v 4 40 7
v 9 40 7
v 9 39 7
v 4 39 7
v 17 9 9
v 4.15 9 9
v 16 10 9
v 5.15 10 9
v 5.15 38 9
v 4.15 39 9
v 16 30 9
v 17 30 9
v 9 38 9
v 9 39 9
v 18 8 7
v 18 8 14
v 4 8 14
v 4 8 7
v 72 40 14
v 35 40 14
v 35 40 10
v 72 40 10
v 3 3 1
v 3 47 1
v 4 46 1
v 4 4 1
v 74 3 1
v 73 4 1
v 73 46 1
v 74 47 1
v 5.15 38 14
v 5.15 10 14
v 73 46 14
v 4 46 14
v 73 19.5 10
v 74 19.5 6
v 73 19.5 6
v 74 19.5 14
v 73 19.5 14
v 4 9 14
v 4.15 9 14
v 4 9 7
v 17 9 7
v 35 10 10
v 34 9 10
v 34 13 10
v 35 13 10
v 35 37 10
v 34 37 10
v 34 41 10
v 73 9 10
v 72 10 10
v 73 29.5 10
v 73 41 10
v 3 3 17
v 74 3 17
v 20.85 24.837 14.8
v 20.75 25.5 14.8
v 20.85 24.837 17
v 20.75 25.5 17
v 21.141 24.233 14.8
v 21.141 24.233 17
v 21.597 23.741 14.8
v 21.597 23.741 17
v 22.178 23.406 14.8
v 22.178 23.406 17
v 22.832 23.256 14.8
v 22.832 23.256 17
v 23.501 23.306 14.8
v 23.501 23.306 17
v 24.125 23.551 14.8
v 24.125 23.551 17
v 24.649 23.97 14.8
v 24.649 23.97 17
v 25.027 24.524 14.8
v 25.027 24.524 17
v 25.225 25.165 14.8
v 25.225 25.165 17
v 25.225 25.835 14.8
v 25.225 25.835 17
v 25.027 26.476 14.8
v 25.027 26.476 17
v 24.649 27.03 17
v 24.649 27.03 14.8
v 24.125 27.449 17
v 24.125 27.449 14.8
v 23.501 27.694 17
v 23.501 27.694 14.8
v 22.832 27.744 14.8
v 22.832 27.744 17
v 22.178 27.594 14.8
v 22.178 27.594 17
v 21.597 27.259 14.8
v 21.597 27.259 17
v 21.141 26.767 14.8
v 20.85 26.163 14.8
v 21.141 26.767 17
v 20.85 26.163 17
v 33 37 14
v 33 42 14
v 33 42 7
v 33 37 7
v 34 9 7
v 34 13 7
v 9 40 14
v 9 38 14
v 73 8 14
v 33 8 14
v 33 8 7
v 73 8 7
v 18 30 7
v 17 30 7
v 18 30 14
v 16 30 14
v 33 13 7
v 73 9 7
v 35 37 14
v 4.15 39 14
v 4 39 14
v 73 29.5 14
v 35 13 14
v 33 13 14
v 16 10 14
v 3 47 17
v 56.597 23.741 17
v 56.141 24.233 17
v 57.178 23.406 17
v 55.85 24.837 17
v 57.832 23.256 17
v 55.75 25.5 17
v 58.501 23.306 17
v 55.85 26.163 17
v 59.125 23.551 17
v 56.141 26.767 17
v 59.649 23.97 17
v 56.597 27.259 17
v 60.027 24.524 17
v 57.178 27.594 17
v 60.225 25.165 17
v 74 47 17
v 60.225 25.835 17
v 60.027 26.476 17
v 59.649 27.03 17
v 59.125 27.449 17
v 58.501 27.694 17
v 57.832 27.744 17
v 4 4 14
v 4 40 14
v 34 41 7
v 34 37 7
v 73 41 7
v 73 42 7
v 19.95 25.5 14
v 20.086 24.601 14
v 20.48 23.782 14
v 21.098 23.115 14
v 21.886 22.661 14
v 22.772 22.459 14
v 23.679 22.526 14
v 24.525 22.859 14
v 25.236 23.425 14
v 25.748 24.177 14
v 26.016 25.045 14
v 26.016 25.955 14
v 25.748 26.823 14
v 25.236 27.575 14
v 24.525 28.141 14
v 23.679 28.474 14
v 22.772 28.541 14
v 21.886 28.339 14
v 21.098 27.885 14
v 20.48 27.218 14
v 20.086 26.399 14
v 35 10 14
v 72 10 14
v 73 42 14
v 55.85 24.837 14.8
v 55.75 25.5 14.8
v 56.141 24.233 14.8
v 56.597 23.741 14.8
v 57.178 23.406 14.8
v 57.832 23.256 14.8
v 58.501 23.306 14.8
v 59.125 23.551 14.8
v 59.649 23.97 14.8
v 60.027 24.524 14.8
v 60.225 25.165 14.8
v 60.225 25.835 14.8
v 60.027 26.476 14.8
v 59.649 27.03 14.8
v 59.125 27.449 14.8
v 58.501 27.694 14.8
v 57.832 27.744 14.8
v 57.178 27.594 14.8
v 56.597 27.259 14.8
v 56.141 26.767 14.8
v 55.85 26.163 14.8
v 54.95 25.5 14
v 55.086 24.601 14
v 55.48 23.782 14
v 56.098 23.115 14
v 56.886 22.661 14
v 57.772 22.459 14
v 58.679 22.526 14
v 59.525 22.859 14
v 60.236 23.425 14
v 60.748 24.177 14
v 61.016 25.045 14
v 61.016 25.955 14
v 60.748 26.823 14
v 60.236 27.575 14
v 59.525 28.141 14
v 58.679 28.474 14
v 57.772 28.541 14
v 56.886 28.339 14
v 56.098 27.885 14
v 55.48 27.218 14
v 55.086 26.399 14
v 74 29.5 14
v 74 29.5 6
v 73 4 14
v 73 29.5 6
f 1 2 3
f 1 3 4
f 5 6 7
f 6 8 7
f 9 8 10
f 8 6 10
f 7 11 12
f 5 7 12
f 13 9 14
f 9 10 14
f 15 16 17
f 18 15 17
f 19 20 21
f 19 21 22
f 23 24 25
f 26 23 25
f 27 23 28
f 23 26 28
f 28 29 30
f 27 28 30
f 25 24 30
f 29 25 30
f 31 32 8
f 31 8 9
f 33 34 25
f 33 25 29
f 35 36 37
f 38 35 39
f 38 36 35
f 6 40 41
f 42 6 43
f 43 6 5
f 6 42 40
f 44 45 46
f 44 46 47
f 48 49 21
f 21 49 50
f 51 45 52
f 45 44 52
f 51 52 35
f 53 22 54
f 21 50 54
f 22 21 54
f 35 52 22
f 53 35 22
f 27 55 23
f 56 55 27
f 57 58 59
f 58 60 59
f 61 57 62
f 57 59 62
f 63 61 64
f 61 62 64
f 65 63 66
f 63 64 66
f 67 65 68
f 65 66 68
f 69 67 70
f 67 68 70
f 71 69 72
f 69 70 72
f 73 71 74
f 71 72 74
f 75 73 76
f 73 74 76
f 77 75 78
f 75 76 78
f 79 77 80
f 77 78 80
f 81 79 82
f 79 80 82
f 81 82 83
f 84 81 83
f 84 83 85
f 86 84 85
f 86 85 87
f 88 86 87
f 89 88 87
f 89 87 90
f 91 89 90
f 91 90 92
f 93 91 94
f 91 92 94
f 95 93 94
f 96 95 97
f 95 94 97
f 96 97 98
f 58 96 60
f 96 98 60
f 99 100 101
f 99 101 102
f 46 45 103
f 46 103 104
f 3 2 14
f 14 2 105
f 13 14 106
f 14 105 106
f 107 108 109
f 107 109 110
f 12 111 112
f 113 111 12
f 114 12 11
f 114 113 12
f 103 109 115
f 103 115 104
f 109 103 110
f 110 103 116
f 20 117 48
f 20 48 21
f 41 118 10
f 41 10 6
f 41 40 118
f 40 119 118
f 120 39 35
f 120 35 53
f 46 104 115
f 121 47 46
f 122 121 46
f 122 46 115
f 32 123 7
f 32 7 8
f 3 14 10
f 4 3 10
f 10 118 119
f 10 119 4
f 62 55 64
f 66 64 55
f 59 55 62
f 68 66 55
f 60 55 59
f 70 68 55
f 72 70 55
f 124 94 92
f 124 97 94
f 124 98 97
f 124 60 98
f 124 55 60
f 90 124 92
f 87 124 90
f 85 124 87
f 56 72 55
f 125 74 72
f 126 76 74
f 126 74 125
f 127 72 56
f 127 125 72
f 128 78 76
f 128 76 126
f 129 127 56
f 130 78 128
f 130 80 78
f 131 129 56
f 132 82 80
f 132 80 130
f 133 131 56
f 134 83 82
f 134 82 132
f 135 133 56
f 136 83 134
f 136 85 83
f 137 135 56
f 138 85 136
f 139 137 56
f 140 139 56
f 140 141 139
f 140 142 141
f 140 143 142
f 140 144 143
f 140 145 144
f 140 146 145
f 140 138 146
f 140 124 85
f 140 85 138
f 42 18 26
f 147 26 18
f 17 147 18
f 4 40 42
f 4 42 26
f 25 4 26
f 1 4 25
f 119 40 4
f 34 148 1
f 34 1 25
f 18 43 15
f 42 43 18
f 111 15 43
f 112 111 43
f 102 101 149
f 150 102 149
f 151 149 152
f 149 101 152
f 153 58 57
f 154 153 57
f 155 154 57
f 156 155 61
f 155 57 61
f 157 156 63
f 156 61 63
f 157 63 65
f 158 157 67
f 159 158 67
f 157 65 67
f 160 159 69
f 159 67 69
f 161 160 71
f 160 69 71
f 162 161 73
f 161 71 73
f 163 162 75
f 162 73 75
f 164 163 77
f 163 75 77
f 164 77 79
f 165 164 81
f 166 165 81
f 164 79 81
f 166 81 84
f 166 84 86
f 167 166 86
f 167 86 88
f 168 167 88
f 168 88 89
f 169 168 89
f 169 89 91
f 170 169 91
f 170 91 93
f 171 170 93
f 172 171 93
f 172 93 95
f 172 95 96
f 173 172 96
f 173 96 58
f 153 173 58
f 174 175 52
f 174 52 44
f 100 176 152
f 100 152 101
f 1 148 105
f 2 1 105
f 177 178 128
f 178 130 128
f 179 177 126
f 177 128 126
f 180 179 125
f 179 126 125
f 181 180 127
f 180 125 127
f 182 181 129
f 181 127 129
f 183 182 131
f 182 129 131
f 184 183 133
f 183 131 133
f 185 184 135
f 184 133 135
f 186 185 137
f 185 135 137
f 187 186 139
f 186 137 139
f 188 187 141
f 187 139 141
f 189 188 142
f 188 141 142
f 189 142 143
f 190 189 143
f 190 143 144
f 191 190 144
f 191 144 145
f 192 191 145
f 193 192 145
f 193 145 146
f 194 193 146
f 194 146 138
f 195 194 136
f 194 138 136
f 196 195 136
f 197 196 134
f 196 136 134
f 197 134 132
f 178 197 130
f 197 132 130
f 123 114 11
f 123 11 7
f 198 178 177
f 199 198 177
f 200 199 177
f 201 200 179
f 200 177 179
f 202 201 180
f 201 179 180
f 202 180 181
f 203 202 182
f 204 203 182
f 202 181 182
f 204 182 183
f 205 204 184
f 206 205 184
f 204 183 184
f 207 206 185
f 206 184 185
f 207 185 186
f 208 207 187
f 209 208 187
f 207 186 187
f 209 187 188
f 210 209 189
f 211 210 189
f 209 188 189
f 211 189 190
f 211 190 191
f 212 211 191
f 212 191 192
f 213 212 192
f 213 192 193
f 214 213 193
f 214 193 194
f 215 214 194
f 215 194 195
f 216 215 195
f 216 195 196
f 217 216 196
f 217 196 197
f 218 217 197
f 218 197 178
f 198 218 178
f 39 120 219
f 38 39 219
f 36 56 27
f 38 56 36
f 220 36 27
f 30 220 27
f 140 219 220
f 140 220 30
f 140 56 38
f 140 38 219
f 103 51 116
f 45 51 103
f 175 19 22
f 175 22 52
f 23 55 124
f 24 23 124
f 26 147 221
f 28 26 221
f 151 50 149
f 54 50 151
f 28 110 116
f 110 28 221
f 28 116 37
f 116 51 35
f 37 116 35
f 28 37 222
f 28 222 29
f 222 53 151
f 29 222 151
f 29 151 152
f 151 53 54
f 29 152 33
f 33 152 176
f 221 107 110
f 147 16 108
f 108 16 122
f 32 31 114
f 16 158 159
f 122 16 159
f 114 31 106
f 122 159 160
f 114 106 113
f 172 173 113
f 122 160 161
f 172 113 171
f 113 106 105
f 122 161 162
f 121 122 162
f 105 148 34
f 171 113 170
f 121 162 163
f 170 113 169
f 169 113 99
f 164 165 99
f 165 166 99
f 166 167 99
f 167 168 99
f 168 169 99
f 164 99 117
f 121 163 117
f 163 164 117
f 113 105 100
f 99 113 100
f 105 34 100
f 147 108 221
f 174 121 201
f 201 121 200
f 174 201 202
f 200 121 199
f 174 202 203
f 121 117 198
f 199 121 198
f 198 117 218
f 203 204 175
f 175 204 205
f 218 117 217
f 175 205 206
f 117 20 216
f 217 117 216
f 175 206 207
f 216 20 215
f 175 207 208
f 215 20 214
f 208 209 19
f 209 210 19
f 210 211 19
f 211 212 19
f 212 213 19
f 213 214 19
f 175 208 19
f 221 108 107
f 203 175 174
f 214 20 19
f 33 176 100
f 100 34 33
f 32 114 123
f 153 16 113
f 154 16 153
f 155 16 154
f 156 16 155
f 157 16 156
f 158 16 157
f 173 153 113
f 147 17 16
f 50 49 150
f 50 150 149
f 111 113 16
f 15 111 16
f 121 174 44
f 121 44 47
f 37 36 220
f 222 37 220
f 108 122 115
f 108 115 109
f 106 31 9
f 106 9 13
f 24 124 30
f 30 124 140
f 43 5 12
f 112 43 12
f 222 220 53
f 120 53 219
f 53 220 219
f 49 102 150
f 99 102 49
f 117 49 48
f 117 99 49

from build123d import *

# Parameters (mm, degrees)
SKETCH033_W         = 71
SKETCH033_H         = 44
PAD022_DEPTH        = 3
HOLE003_D           = 4.5
HOLE003_DEPTH       = 25
HOLE003_CSINK_D     = 6.1
HOLE003_CSINK_ANGLE = 90
PAD023_DEPTH        = 7
SKETCH036_W         = 71
SKETCH036_H         = 44
SKETCH036_W_2       = 69
SKETCH036_H_2       = 42
PAD024_DEPTH        = 13
PAD025_DEPTH        = 7
SKETCH_W            = 10
SKETCH_H            = 8
POCKET005_DEPTH     = 5
PAD026_DEPTH        = 5
PAD029_DEPTH        = 4


with BuildPart() as part:
    # Sketch033 → Pad022 (new body)
    with BuildSketch(Plane.XY):
        with Locations((35.5, 22)):
            Rectangle(SKETCH033_W, SKETCH033_H)
    extrude(amount=-PAD022_DEPTH)

    # Hole003
    with Locations(Plane(origin=(0, 0, -3), x_dir=(1, 0, 0), z_dir=(0, 0, -1))):
        with Locations((20, -22.5), (55, -22.5)):
            CounterSinkHole(HOLE003_D / 2, HOLE003_CSINK_D / 2, depth=HOLE003_DEPTH, counter_sink_angle=HOLE003_CSINK_ANGLE)

    # Sketch035 → Pad023 (join)
    with BuildSketch(Plane.XY.offset(-3)):
        Polygon((71, 39), (30, 39), (30, 34), (31, 34), (31, 38), (70, 38), (70, 6), (31, 6), (31, 10), (30, 10), (30, 5), (71, 5), align=None)
    extrude(amount=-PAD023_DEPTH)

    # Sketch036 → Pad024 (join)
    with BuildSketch(Plane.XY.offset(-3)):
        with Locations((35.5, 22)):
            Rectangle(SKETCH036_W, SKETCH036_H)
        with Locations((35.5, 22)):
            Rectangle(SKETCH036_W_2, SKETCH036_H_2, mode=Mode.SUBTRACT)
    extrude(amount=-PAD024_DEPTH)

    # Sketch038 → Pad025 (join)
    with BuildSketch(Plane.XY.offset(-3)):
        Polygon((6, 37), (6, 36), (1, 36), (1, 6), (14, 6), (14, 27), (15, 27), (15, 5), (0, 5), (0, 37), align=None)
    extrude(amount=-PAD025_DEPTH)

    # Sketch (on Face9 of Pad025) → Pocket005 (cut)
    with BuildSketch(Plane.YZ.offset(71)):
        with Locations((21.5, -7)):
            Rectangle(SKETCH_W, SKETCH_H)
    extrude(amount=-POCKET005_DEPTH, mode=Mode.SUBTRACT)

    # Sketch039 → Pad026 (join)
    with BuildSketch(Plane.XY.offset(-3)):
        Polygon((6, 36), (1.15, 36), (1.15, 6), (14, 6), (14, 27), (13, 27), (13, 7), (2.15, 7), (2.15, 35), (6, 35), align=None)
    extrude(amount=-PAD026_DEPTH)

    # Sketch042 → Pad029 (join)
    with BuildSketch(Plane.XY.offset(-3)):
        Polygon((31, 10), (31, 6), (70, 6), (70, 38), (31, 38), (31, 34), (32, 34), (32, 37), (69, 37), (69, 7), (32, 7), (32, 10), align=None)
    extrude(amount=-PAD029_DEPTH)


with BuildPart() as part_1:
    # Body011 placement: moved
    add(part.part.moved(Location((3, 3, 17))))


solid = part_1.part
